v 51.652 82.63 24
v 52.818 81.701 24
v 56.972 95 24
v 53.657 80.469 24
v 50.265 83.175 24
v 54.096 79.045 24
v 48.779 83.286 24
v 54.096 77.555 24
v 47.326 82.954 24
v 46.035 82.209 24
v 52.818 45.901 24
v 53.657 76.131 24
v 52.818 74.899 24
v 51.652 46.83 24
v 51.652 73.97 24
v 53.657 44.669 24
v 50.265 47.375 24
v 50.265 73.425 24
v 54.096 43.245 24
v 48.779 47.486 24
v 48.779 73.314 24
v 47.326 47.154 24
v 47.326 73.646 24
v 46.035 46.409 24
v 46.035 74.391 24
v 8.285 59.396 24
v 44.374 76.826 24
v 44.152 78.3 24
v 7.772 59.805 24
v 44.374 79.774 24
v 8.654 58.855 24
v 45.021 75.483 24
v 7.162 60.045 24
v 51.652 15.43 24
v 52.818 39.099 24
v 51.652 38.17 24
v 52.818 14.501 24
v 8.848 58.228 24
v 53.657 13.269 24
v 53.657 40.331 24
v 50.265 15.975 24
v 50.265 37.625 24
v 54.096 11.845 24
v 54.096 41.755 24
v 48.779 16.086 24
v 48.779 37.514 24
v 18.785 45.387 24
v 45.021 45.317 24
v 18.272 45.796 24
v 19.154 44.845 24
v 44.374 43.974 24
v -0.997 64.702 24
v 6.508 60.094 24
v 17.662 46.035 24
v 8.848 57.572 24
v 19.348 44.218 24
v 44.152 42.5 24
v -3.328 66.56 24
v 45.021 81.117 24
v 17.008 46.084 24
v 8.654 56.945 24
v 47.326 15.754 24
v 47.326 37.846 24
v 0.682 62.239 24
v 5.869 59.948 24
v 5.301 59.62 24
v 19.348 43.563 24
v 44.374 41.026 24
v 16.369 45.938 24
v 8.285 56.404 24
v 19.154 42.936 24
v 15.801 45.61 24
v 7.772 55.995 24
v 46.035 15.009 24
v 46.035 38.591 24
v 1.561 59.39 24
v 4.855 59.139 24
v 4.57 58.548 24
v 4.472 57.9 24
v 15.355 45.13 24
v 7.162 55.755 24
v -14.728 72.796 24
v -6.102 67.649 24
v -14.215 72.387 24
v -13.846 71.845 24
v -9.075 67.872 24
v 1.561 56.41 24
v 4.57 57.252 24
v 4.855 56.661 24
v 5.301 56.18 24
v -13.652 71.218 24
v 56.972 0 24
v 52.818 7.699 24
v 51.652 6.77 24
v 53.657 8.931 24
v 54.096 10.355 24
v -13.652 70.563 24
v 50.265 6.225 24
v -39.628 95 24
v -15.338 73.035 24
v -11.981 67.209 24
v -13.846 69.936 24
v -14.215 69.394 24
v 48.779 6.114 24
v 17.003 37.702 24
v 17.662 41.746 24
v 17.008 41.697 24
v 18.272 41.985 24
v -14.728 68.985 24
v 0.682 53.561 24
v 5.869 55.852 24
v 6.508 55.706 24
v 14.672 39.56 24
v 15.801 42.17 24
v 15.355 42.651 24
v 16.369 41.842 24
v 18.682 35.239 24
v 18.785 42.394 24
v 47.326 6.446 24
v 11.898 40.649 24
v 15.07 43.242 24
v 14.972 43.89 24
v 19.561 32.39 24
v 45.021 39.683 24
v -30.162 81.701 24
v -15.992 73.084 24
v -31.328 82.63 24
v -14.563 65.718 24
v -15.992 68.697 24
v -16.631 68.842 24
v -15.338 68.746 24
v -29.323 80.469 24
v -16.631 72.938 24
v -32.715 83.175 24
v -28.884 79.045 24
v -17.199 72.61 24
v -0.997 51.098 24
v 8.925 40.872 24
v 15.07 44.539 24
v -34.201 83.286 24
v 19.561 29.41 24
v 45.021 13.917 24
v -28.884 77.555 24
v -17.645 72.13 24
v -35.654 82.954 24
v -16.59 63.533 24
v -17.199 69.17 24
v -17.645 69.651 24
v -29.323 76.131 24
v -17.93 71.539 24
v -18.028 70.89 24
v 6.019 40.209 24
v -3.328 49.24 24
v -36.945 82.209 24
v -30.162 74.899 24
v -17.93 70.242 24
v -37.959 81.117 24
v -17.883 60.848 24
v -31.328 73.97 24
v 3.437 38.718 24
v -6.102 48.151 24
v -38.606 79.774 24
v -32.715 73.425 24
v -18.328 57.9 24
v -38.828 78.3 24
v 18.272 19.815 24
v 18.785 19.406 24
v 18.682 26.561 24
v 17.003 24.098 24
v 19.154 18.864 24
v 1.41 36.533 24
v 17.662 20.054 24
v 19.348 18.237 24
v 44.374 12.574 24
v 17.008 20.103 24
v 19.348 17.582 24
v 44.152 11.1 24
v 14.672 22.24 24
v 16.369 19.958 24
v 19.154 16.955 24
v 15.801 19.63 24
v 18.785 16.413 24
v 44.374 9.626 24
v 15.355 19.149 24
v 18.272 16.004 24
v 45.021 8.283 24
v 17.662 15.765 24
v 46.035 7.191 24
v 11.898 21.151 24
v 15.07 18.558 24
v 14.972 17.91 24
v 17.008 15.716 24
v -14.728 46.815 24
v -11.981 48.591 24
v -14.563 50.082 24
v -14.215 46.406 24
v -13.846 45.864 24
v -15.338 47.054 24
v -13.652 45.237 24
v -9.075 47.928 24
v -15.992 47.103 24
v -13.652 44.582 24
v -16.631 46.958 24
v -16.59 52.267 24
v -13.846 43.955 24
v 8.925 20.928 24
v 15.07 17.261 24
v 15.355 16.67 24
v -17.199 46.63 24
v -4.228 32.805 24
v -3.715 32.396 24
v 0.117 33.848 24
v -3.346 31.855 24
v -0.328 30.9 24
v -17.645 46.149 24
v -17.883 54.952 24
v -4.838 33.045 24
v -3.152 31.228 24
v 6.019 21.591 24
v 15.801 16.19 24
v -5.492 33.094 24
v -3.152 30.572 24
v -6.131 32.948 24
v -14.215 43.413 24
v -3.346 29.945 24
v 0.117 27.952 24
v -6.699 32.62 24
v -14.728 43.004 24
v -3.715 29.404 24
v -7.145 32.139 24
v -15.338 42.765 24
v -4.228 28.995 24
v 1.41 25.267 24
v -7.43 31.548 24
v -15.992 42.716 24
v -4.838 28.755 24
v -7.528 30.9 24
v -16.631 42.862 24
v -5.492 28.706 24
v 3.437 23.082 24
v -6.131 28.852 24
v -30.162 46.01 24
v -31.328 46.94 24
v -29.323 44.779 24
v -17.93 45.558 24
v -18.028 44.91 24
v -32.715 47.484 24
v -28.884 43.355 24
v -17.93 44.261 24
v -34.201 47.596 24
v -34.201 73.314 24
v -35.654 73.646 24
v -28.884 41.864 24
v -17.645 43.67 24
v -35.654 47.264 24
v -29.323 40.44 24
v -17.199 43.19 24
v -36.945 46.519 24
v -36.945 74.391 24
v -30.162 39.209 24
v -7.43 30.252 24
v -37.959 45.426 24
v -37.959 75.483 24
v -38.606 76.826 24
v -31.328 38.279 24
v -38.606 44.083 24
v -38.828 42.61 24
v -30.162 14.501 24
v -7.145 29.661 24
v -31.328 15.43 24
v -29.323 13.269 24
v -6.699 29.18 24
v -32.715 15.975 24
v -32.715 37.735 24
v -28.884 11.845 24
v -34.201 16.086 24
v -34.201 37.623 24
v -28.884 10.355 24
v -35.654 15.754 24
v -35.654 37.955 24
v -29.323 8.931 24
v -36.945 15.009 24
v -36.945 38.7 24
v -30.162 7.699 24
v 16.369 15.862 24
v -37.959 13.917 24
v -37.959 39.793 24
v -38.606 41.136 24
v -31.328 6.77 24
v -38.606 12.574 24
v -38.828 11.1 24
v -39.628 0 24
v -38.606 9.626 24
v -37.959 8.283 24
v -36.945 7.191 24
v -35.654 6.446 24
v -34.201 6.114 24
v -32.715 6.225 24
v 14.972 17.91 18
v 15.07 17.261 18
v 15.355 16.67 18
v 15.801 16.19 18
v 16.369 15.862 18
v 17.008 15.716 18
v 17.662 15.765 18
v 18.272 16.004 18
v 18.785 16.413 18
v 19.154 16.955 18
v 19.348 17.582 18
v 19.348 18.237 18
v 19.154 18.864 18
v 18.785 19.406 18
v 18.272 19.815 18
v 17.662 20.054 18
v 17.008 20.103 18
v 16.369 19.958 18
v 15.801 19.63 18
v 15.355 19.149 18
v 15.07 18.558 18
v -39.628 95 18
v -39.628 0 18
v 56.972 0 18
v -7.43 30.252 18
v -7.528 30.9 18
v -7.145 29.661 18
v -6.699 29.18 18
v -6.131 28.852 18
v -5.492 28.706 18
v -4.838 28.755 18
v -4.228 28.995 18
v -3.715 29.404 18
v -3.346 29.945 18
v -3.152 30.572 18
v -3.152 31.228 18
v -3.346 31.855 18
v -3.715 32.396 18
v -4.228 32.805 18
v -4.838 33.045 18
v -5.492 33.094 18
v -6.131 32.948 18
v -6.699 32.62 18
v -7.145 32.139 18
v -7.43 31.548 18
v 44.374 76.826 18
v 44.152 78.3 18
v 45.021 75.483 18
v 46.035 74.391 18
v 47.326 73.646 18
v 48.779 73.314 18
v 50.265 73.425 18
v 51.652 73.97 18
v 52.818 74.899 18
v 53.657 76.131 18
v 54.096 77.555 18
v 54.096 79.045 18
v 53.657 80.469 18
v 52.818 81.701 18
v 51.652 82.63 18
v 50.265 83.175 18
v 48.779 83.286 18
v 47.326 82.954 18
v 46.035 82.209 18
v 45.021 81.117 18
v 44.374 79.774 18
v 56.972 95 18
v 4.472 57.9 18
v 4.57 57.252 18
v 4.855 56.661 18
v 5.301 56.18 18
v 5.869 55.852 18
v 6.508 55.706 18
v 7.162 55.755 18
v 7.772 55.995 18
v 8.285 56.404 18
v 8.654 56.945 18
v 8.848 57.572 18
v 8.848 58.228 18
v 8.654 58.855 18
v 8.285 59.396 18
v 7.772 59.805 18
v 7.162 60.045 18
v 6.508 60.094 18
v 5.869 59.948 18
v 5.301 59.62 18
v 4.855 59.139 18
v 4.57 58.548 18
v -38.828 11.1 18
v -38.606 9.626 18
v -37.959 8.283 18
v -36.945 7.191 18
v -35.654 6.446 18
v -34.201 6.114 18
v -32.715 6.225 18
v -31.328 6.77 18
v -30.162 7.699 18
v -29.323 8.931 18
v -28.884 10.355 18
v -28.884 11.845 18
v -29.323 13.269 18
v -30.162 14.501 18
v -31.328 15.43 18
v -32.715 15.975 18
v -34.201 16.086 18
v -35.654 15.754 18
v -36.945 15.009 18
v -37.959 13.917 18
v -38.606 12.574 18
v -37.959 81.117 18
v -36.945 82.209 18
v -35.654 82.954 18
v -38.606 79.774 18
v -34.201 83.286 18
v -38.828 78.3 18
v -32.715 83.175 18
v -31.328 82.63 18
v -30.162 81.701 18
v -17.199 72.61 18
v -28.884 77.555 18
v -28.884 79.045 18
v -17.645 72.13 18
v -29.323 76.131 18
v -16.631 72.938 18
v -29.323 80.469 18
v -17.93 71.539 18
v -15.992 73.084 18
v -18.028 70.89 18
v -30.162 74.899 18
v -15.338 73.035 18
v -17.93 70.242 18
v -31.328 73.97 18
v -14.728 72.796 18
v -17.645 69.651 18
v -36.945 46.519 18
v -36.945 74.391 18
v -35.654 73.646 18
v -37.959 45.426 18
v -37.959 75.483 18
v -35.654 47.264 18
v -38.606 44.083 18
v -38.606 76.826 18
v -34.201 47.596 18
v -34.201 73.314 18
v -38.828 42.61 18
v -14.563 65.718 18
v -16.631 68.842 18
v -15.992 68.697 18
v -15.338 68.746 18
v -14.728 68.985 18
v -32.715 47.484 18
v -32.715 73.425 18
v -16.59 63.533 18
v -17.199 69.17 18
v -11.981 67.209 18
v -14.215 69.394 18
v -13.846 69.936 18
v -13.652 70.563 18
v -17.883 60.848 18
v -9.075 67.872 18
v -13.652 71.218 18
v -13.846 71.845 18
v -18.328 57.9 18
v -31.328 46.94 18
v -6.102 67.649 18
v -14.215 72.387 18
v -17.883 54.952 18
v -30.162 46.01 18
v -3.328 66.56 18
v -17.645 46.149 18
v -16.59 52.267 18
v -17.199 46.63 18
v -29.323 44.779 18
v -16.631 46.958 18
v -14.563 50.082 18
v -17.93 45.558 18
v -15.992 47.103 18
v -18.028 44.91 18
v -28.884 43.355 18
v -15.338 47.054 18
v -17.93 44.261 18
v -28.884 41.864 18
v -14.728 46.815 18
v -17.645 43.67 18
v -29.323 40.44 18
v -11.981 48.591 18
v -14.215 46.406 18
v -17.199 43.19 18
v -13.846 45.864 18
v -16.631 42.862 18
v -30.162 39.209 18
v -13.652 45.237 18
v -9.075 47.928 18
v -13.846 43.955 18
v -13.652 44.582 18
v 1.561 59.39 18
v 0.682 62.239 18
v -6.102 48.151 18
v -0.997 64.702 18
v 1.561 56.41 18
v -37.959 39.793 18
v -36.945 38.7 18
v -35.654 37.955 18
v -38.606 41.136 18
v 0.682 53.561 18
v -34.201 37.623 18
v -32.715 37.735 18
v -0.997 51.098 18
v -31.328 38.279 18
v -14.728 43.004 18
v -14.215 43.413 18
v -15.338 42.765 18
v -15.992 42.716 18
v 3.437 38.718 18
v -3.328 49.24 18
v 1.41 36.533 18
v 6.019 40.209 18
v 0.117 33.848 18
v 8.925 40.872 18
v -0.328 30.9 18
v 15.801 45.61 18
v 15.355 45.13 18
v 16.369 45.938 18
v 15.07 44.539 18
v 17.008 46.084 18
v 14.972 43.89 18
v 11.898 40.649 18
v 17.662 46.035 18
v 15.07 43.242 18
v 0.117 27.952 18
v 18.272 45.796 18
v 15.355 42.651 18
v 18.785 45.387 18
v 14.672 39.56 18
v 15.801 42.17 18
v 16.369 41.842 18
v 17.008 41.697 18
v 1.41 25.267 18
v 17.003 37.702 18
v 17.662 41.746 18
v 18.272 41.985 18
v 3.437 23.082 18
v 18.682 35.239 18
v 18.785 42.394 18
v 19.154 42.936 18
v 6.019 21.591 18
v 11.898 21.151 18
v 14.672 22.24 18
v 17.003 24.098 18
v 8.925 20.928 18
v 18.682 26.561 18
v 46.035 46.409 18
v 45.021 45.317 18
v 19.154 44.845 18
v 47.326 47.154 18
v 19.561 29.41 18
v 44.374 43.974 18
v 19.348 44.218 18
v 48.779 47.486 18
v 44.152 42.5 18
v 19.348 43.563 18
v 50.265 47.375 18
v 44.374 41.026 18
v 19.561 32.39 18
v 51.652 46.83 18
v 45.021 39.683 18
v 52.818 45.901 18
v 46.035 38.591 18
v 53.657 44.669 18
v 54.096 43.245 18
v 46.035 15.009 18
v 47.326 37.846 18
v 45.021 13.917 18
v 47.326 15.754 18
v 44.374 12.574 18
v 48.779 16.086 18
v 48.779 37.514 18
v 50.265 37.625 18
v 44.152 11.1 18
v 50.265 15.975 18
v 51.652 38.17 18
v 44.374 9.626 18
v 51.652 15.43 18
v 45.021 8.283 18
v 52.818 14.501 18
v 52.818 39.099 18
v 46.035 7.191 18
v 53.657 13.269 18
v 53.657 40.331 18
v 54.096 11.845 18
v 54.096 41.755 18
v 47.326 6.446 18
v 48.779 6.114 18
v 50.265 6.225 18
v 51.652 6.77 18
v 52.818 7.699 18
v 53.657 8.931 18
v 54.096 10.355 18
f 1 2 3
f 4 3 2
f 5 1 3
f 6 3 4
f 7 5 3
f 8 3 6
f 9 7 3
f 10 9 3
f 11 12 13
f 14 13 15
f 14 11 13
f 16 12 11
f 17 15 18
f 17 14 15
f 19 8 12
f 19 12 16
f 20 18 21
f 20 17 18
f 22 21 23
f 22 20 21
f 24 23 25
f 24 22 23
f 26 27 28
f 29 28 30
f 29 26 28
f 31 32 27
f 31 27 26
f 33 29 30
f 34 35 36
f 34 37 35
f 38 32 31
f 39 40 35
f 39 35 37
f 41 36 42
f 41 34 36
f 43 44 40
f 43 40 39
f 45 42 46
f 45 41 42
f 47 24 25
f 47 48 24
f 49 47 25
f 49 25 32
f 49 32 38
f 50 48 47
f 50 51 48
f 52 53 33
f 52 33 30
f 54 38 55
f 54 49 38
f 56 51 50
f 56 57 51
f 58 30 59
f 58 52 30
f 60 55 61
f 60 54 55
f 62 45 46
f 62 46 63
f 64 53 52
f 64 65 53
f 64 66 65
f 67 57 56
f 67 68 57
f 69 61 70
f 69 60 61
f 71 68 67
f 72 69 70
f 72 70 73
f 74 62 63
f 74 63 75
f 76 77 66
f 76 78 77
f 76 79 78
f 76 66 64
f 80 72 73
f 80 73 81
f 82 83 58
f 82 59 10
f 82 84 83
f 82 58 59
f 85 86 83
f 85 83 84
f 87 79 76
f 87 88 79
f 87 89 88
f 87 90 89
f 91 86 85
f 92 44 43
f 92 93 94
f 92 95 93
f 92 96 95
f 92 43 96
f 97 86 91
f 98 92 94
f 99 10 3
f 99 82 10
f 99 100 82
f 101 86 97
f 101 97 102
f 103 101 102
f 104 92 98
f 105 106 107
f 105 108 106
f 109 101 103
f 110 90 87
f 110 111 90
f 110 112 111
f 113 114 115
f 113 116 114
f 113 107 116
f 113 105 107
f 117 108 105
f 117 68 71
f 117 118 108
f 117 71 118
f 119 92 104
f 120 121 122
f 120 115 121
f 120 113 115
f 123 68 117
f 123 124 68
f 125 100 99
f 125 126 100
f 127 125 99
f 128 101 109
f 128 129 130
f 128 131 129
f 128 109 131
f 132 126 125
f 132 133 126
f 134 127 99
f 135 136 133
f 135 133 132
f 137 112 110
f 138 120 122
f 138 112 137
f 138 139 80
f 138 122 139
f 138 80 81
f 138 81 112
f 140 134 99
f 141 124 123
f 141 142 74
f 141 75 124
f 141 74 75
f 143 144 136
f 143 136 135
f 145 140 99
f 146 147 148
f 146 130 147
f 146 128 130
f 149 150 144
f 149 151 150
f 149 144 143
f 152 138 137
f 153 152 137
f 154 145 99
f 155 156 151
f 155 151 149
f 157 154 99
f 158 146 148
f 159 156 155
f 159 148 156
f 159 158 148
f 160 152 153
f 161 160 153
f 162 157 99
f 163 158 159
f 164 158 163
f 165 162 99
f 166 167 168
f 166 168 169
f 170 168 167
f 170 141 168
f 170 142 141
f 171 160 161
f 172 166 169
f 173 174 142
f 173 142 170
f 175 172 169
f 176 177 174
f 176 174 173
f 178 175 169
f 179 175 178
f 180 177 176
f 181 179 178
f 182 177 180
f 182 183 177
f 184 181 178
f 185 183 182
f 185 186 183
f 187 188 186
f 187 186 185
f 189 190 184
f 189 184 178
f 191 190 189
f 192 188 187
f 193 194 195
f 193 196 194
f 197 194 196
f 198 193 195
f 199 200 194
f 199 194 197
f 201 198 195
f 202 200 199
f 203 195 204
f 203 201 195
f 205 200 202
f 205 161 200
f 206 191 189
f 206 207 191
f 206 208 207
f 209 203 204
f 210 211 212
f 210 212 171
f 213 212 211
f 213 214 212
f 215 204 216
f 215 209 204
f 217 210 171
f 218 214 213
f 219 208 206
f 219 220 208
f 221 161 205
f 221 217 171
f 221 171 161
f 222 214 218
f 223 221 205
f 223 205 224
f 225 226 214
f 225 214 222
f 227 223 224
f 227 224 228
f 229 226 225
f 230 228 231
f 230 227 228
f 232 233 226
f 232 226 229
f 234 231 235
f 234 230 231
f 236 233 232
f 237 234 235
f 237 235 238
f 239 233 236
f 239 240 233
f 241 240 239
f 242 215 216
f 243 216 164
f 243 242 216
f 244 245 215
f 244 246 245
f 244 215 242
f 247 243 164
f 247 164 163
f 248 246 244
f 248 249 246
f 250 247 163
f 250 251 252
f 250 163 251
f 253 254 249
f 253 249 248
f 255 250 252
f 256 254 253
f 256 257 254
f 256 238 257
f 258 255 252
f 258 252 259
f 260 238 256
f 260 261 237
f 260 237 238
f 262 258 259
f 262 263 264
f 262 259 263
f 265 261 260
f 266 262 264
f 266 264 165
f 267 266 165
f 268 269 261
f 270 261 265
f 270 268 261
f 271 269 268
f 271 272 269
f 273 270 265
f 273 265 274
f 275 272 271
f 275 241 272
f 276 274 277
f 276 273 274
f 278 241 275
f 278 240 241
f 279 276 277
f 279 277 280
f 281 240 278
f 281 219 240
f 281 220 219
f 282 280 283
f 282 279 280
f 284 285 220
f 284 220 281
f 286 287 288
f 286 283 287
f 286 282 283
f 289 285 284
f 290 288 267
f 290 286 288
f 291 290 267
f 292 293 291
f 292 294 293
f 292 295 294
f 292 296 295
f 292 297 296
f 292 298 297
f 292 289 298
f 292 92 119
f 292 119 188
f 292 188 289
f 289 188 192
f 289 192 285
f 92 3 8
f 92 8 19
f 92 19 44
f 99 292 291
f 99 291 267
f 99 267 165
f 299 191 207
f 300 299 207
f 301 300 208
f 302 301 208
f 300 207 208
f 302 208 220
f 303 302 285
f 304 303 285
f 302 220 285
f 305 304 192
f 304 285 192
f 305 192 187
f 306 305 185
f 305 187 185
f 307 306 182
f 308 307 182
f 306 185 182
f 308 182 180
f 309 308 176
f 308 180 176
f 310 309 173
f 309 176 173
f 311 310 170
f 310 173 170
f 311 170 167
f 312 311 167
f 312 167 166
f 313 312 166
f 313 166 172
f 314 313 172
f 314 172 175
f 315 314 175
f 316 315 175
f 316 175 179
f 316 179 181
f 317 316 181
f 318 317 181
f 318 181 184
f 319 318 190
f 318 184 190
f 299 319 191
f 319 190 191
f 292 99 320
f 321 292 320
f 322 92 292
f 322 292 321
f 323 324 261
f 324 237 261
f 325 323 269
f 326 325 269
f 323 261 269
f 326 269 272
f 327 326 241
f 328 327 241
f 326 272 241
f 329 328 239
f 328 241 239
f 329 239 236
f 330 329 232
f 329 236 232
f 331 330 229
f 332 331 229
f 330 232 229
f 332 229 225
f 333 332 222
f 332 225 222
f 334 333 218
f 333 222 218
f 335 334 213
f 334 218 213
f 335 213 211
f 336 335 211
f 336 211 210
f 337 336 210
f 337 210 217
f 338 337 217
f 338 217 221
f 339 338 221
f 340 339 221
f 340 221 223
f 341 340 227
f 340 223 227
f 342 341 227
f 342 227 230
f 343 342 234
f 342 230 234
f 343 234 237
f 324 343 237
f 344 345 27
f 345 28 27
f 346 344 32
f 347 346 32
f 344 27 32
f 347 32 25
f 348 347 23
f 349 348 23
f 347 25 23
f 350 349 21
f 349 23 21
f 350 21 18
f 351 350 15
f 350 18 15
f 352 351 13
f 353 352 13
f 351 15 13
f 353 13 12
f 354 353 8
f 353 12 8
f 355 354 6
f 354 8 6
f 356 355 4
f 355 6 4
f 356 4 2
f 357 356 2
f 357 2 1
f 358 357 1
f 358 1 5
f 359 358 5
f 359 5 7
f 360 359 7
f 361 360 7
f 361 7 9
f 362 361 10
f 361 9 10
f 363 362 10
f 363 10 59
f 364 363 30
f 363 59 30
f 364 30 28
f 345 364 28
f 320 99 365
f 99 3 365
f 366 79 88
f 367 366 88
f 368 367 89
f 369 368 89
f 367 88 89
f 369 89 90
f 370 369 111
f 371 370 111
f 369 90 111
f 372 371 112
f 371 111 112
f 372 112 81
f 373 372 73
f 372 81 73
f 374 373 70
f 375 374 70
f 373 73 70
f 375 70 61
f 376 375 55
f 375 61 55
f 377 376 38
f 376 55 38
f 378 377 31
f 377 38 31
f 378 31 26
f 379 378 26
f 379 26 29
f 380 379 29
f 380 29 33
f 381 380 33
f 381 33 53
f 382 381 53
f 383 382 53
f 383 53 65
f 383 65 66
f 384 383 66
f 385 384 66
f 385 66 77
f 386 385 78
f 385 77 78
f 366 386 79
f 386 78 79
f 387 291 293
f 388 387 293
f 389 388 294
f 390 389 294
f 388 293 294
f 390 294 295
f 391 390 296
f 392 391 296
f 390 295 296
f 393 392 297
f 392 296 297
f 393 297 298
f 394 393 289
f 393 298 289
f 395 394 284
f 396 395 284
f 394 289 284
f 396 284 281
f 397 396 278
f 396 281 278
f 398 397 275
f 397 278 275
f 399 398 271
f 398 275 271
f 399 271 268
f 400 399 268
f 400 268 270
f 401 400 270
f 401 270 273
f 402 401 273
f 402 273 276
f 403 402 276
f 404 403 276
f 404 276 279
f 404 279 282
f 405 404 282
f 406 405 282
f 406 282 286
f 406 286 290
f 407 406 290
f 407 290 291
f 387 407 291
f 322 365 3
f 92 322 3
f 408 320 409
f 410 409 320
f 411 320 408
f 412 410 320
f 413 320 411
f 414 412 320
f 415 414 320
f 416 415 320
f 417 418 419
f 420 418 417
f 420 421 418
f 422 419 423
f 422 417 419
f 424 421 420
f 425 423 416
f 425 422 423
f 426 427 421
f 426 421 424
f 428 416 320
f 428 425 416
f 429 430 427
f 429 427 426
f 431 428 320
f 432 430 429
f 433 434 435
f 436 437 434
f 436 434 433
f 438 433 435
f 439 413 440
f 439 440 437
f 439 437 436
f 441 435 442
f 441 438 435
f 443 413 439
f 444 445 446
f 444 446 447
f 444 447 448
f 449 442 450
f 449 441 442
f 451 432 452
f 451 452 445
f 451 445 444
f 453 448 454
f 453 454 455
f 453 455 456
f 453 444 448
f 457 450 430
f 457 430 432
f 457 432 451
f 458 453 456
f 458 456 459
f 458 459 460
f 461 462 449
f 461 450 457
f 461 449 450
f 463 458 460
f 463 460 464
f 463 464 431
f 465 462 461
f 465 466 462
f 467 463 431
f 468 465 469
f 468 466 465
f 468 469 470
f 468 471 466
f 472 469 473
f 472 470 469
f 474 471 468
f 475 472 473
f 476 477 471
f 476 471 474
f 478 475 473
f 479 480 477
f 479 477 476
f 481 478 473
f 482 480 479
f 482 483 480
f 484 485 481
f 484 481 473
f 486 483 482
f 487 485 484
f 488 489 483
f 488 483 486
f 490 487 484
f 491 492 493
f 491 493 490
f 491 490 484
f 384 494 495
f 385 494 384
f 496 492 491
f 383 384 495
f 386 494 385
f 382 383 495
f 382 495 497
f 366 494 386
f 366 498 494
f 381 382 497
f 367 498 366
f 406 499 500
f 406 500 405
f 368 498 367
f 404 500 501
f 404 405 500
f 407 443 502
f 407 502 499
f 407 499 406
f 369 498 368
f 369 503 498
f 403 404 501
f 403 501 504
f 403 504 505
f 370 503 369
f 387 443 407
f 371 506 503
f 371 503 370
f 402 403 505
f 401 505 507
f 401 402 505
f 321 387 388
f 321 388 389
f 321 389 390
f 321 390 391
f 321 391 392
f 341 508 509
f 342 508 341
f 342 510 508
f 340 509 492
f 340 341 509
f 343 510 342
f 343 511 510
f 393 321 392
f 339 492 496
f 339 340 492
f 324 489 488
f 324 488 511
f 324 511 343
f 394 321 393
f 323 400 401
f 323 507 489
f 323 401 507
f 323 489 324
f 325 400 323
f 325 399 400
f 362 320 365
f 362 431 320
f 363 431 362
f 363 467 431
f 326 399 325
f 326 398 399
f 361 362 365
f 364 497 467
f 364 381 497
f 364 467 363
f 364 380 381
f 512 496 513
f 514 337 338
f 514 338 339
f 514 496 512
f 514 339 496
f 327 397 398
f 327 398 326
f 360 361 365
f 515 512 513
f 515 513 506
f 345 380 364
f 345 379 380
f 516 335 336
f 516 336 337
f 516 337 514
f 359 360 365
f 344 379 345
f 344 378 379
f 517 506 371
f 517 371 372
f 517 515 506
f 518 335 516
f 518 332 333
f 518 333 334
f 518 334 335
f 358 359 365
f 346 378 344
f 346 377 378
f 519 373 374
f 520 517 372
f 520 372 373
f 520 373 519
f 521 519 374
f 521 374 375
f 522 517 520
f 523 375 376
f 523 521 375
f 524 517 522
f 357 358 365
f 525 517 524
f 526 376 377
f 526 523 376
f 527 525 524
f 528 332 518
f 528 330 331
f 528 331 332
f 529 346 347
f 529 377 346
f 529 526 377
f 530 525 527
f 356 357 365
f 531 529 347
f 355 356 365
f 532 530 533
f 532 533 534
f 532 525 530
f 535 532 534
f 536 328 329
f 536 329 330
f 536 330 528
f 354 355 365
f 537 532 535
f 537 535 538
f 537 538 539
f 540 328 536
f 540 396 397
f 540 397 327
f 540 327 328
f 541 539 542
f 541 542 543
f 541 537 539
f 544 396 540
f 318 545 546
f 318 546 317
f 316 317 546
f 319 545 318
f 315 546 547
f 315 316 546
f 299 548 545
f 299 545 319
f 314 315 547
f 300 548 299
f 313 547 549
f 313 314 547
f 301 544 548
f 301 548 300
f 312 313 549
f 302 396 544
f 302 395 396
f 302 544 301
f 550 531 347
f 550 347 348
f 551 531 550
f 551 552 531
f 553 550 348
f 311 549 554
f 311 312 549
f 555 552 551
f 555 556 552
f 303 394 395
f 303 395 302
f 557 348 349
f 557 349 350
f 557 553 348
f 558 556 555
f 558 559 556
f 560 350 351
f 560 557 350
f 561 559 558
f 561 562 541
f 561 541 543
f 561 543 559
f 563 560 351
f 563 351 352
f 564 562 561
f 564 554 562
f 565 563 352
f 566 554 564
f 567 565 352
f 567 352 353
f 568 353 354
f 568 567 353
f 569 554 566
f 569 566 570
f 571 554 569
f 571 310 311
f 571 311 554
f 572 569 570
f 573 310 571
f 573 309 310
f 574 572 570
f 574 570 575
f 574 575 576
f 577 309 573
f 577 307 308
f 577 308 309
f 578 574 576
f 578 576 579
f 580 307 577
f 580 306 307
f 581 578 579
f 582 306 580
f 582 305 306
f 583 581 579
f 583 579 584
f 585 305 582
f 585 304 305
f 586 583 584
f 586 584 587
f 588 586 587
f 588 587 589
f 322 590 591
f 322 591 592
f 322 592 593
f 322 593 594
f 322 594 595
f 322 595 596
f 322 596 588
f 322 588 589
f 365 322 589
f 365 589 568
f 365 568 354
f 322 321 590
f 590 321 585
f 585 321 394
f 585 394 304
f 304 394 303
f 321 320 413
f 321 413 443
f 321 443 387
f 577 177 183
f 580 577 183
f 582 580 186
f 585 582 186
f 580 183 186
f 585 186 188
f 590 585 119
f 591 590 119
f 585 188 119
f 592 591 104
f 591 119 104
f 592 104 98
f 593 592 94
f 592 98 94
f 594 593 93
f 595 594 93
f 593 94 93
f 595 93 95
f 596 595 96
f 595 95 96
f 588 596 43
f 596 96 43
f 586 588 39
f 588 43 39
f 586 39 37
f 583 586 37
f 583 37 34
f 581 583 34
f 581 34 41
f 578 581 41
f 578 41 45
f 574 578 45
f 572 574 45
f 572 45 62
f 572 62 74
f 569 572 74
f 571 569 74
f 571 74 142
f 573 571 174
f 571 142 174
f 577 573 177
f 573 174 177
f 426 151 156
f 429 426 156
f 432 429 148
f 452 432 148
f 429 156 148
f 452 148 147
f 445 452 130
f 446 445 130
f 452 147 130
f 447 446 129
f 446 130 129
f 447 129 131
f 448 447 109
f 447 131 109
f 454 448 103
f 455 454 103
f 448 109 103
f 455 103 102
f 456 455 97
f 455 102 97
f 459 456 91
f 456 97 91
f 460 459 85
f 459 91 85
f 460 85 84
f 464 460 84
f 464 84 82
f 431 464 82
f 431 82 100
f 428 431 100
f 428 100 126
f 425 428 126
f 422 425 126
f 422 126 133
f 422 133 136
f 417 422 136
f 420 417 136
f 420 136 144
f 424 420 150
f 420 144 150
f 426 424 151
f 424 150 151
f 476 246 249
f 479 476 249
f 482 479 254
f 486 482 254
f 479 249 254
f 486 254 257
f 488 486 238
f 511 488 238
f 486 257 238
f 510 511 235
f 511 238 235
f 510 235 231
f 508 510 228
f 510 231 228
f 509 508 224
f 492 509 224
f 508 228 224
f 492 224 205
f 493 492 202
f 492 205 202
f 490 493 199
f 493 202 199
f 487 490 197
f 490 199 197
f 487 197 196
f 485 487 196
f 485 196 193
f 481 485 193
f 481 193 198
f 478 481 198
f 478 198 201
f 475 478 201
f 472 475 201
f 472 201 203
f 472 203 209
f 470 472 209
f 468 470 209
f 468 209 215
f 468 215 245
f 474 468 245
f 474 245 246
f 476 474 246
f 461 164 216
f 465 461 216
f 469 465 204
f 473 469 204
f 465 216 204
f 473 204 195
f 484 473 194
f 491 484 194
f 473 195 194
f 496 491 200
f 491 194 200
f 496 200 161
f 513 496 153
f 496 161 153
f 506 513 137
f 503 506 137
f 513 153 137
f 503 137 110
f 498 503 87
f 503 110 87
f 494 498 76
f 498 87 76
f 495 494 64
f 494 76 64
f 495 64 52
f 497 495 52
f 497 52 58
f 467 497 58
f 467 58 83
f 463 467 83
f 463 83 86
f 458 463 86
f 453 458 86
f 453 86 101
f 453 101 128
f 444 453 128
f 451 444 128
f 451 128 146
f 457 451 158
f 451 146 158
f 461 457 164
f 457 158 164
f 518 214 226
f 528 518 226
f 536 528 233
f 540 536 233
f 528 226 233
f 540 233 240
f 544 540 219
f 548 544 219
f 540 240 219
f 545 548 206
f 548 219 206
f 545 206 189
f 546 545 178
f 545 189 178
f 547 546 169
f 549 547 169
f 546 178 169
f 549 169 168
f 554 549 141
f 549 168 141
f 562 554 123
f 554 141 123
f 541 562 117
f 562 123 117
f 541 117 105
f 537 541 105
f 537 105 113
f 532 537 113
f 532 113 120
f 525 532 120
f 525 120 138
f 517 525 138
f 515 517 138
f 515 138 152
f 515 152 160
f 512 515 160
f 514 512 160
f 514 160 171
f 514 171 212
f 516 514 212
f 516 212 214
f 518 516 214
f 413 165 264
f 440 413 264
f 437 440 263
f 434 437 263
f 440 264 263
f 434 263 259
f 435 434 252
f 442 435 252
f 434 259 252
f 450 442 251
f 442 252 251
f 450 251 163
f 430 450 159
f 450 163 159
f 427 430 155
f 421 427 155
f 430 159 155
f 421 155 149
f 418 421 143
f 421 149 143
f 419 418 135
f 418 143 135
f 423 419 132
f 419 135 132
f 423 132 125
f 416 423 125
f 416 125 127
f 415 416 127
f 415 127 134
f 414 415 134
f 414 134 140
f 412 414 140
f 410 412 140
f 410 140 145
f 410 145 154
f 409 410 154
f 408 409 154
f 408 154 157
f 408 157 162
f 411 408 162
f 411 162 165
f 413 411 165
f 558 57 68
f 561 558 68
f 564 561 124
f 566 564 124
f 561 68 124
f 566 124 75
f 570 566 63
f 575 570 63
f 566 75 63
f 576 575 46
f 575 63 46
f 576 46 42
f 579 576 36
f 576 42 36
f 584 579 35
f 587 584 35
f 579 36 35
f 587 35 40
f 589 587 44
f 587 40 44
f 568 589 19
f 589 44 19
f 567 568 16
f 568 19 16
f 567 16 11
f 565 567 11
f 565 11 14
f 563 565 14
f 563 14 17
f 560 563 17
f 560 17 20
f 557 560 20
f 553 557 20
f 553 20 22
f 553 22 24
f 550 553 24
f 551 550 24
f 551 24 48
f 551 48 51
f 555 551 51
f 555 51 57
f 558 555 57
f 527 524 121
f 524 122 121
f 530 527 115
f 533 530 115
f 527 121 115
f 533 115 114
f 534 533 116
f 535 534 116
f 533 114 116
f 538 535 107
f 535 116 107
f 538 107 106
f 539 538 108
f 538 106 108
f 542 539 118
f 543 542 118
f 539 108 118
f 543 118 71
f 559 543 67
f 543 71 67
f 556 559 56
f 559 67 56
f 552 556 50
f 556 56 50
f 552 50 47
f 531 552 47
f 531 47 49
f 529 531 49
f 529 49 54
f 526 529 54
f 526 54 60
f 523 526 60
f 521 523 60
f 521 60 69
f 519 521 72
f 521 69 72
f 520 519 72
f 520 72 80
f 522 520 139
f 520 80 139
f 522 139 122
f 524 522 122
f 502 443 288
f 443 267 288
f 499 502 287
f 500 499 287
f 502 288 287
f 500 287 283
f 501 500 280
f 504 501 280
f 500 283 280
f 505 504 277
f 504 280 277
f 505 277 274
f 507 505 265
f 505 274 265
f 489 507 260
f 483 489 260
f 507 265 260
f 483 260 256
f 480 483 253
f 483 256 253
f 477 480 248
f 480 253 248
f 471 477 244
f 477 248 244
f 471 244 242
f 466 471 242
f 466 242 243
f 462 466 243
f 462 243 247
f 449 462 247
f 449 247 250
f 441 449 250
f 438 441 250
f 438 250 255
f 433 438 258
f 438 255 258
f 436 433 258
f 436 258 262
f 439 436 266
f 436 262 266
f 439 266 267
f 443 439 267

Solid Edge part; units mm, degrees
sketch "Sketch1" plane through (0, 0, 0) normal (0, -1, 0) x (1, 0, 0)
  line L0 (-39.6277, 18) -> (56.9723, 18)
  line L1 (56.9723, 18) -> (56.9723, 24)
  line L2 (56.9723, 24) -> (-39.6277, 24)
  line L3 (-39.6277, 24) -> (-39.6277, 18)
  dimension "D1" = 96.6
  dimension "D2" = 6
extrude "Protrusion1" add sketch "Sketch1" against normal blind 95
sketch "Sketch2" plane through (8.6723, 47.5, 24) normal (0, 0, 1) x (-1, 0, 0)
  circle A0 centre (-40.48, 36.4) radius 5
  circle A1 centre (-40.48, 5) radius 5
  circle A2 centre (-40.48, -30.8) radius 5
  circle A3 centre (42.5, -30.8) radius 5
  circle A4 centre (42.5, 4.8905) radius 5
  circle A5 centre (42.5, 36.4) radius 5
extrude "ExtrudedCutout_1" cut sketch "Sketch2" against normal blind 37.274
sketch "Sketch3" plane through (8.6723, 47.5, 24) normal (0, 0, 1) x (-1, 0, 0)
  circle A0 centre (-8.5, 29.5904) radius 2.2
  circle A1 centre (14, 16.6) radius 2.2
  circle A2 centre (-8.5, 3.6096) radius 2.2
  circle A3 centre (2, -10.4) radius 2.2
  circle A4 centre (24.5, 2.5904) radius 2.2
  circle A5 centre (24.5, -23.3904) radius 2.2
  dimension "D1" = 30
  dimension "D2" = 3
  dimension "D3" = 2
  dimension "D4" = 20
  dimension "D5" = 30
  dimension "D6" = 2.8
  dimension "D7" = 2
  dimension "D8" = 27
extrude "ExtrudedCutout_2" cut sketch "Sketch3" against normal blind 69.9248
sketch "Sketch4" plane through (8.6723, 47.5, 24) normal (0, 0, 1) x (-1, 0, 0)
  circle A0 centre (-1, 16.6) radius 10
  circle A1 centre (17, -10.4) radius 10
  dimension "D1" = 30
  dimension "D2" = 3
  dimension "D3" = 2
  dimension "D4" = 20
  dimension "D5" = 30
  dimension "D6" = 2.8
  dimension "D7" = 2
  dimension "D8" = 27
extrude "ExtrudedCutout_3" cut sketch "Sketch4" against normal blind 48.6044
